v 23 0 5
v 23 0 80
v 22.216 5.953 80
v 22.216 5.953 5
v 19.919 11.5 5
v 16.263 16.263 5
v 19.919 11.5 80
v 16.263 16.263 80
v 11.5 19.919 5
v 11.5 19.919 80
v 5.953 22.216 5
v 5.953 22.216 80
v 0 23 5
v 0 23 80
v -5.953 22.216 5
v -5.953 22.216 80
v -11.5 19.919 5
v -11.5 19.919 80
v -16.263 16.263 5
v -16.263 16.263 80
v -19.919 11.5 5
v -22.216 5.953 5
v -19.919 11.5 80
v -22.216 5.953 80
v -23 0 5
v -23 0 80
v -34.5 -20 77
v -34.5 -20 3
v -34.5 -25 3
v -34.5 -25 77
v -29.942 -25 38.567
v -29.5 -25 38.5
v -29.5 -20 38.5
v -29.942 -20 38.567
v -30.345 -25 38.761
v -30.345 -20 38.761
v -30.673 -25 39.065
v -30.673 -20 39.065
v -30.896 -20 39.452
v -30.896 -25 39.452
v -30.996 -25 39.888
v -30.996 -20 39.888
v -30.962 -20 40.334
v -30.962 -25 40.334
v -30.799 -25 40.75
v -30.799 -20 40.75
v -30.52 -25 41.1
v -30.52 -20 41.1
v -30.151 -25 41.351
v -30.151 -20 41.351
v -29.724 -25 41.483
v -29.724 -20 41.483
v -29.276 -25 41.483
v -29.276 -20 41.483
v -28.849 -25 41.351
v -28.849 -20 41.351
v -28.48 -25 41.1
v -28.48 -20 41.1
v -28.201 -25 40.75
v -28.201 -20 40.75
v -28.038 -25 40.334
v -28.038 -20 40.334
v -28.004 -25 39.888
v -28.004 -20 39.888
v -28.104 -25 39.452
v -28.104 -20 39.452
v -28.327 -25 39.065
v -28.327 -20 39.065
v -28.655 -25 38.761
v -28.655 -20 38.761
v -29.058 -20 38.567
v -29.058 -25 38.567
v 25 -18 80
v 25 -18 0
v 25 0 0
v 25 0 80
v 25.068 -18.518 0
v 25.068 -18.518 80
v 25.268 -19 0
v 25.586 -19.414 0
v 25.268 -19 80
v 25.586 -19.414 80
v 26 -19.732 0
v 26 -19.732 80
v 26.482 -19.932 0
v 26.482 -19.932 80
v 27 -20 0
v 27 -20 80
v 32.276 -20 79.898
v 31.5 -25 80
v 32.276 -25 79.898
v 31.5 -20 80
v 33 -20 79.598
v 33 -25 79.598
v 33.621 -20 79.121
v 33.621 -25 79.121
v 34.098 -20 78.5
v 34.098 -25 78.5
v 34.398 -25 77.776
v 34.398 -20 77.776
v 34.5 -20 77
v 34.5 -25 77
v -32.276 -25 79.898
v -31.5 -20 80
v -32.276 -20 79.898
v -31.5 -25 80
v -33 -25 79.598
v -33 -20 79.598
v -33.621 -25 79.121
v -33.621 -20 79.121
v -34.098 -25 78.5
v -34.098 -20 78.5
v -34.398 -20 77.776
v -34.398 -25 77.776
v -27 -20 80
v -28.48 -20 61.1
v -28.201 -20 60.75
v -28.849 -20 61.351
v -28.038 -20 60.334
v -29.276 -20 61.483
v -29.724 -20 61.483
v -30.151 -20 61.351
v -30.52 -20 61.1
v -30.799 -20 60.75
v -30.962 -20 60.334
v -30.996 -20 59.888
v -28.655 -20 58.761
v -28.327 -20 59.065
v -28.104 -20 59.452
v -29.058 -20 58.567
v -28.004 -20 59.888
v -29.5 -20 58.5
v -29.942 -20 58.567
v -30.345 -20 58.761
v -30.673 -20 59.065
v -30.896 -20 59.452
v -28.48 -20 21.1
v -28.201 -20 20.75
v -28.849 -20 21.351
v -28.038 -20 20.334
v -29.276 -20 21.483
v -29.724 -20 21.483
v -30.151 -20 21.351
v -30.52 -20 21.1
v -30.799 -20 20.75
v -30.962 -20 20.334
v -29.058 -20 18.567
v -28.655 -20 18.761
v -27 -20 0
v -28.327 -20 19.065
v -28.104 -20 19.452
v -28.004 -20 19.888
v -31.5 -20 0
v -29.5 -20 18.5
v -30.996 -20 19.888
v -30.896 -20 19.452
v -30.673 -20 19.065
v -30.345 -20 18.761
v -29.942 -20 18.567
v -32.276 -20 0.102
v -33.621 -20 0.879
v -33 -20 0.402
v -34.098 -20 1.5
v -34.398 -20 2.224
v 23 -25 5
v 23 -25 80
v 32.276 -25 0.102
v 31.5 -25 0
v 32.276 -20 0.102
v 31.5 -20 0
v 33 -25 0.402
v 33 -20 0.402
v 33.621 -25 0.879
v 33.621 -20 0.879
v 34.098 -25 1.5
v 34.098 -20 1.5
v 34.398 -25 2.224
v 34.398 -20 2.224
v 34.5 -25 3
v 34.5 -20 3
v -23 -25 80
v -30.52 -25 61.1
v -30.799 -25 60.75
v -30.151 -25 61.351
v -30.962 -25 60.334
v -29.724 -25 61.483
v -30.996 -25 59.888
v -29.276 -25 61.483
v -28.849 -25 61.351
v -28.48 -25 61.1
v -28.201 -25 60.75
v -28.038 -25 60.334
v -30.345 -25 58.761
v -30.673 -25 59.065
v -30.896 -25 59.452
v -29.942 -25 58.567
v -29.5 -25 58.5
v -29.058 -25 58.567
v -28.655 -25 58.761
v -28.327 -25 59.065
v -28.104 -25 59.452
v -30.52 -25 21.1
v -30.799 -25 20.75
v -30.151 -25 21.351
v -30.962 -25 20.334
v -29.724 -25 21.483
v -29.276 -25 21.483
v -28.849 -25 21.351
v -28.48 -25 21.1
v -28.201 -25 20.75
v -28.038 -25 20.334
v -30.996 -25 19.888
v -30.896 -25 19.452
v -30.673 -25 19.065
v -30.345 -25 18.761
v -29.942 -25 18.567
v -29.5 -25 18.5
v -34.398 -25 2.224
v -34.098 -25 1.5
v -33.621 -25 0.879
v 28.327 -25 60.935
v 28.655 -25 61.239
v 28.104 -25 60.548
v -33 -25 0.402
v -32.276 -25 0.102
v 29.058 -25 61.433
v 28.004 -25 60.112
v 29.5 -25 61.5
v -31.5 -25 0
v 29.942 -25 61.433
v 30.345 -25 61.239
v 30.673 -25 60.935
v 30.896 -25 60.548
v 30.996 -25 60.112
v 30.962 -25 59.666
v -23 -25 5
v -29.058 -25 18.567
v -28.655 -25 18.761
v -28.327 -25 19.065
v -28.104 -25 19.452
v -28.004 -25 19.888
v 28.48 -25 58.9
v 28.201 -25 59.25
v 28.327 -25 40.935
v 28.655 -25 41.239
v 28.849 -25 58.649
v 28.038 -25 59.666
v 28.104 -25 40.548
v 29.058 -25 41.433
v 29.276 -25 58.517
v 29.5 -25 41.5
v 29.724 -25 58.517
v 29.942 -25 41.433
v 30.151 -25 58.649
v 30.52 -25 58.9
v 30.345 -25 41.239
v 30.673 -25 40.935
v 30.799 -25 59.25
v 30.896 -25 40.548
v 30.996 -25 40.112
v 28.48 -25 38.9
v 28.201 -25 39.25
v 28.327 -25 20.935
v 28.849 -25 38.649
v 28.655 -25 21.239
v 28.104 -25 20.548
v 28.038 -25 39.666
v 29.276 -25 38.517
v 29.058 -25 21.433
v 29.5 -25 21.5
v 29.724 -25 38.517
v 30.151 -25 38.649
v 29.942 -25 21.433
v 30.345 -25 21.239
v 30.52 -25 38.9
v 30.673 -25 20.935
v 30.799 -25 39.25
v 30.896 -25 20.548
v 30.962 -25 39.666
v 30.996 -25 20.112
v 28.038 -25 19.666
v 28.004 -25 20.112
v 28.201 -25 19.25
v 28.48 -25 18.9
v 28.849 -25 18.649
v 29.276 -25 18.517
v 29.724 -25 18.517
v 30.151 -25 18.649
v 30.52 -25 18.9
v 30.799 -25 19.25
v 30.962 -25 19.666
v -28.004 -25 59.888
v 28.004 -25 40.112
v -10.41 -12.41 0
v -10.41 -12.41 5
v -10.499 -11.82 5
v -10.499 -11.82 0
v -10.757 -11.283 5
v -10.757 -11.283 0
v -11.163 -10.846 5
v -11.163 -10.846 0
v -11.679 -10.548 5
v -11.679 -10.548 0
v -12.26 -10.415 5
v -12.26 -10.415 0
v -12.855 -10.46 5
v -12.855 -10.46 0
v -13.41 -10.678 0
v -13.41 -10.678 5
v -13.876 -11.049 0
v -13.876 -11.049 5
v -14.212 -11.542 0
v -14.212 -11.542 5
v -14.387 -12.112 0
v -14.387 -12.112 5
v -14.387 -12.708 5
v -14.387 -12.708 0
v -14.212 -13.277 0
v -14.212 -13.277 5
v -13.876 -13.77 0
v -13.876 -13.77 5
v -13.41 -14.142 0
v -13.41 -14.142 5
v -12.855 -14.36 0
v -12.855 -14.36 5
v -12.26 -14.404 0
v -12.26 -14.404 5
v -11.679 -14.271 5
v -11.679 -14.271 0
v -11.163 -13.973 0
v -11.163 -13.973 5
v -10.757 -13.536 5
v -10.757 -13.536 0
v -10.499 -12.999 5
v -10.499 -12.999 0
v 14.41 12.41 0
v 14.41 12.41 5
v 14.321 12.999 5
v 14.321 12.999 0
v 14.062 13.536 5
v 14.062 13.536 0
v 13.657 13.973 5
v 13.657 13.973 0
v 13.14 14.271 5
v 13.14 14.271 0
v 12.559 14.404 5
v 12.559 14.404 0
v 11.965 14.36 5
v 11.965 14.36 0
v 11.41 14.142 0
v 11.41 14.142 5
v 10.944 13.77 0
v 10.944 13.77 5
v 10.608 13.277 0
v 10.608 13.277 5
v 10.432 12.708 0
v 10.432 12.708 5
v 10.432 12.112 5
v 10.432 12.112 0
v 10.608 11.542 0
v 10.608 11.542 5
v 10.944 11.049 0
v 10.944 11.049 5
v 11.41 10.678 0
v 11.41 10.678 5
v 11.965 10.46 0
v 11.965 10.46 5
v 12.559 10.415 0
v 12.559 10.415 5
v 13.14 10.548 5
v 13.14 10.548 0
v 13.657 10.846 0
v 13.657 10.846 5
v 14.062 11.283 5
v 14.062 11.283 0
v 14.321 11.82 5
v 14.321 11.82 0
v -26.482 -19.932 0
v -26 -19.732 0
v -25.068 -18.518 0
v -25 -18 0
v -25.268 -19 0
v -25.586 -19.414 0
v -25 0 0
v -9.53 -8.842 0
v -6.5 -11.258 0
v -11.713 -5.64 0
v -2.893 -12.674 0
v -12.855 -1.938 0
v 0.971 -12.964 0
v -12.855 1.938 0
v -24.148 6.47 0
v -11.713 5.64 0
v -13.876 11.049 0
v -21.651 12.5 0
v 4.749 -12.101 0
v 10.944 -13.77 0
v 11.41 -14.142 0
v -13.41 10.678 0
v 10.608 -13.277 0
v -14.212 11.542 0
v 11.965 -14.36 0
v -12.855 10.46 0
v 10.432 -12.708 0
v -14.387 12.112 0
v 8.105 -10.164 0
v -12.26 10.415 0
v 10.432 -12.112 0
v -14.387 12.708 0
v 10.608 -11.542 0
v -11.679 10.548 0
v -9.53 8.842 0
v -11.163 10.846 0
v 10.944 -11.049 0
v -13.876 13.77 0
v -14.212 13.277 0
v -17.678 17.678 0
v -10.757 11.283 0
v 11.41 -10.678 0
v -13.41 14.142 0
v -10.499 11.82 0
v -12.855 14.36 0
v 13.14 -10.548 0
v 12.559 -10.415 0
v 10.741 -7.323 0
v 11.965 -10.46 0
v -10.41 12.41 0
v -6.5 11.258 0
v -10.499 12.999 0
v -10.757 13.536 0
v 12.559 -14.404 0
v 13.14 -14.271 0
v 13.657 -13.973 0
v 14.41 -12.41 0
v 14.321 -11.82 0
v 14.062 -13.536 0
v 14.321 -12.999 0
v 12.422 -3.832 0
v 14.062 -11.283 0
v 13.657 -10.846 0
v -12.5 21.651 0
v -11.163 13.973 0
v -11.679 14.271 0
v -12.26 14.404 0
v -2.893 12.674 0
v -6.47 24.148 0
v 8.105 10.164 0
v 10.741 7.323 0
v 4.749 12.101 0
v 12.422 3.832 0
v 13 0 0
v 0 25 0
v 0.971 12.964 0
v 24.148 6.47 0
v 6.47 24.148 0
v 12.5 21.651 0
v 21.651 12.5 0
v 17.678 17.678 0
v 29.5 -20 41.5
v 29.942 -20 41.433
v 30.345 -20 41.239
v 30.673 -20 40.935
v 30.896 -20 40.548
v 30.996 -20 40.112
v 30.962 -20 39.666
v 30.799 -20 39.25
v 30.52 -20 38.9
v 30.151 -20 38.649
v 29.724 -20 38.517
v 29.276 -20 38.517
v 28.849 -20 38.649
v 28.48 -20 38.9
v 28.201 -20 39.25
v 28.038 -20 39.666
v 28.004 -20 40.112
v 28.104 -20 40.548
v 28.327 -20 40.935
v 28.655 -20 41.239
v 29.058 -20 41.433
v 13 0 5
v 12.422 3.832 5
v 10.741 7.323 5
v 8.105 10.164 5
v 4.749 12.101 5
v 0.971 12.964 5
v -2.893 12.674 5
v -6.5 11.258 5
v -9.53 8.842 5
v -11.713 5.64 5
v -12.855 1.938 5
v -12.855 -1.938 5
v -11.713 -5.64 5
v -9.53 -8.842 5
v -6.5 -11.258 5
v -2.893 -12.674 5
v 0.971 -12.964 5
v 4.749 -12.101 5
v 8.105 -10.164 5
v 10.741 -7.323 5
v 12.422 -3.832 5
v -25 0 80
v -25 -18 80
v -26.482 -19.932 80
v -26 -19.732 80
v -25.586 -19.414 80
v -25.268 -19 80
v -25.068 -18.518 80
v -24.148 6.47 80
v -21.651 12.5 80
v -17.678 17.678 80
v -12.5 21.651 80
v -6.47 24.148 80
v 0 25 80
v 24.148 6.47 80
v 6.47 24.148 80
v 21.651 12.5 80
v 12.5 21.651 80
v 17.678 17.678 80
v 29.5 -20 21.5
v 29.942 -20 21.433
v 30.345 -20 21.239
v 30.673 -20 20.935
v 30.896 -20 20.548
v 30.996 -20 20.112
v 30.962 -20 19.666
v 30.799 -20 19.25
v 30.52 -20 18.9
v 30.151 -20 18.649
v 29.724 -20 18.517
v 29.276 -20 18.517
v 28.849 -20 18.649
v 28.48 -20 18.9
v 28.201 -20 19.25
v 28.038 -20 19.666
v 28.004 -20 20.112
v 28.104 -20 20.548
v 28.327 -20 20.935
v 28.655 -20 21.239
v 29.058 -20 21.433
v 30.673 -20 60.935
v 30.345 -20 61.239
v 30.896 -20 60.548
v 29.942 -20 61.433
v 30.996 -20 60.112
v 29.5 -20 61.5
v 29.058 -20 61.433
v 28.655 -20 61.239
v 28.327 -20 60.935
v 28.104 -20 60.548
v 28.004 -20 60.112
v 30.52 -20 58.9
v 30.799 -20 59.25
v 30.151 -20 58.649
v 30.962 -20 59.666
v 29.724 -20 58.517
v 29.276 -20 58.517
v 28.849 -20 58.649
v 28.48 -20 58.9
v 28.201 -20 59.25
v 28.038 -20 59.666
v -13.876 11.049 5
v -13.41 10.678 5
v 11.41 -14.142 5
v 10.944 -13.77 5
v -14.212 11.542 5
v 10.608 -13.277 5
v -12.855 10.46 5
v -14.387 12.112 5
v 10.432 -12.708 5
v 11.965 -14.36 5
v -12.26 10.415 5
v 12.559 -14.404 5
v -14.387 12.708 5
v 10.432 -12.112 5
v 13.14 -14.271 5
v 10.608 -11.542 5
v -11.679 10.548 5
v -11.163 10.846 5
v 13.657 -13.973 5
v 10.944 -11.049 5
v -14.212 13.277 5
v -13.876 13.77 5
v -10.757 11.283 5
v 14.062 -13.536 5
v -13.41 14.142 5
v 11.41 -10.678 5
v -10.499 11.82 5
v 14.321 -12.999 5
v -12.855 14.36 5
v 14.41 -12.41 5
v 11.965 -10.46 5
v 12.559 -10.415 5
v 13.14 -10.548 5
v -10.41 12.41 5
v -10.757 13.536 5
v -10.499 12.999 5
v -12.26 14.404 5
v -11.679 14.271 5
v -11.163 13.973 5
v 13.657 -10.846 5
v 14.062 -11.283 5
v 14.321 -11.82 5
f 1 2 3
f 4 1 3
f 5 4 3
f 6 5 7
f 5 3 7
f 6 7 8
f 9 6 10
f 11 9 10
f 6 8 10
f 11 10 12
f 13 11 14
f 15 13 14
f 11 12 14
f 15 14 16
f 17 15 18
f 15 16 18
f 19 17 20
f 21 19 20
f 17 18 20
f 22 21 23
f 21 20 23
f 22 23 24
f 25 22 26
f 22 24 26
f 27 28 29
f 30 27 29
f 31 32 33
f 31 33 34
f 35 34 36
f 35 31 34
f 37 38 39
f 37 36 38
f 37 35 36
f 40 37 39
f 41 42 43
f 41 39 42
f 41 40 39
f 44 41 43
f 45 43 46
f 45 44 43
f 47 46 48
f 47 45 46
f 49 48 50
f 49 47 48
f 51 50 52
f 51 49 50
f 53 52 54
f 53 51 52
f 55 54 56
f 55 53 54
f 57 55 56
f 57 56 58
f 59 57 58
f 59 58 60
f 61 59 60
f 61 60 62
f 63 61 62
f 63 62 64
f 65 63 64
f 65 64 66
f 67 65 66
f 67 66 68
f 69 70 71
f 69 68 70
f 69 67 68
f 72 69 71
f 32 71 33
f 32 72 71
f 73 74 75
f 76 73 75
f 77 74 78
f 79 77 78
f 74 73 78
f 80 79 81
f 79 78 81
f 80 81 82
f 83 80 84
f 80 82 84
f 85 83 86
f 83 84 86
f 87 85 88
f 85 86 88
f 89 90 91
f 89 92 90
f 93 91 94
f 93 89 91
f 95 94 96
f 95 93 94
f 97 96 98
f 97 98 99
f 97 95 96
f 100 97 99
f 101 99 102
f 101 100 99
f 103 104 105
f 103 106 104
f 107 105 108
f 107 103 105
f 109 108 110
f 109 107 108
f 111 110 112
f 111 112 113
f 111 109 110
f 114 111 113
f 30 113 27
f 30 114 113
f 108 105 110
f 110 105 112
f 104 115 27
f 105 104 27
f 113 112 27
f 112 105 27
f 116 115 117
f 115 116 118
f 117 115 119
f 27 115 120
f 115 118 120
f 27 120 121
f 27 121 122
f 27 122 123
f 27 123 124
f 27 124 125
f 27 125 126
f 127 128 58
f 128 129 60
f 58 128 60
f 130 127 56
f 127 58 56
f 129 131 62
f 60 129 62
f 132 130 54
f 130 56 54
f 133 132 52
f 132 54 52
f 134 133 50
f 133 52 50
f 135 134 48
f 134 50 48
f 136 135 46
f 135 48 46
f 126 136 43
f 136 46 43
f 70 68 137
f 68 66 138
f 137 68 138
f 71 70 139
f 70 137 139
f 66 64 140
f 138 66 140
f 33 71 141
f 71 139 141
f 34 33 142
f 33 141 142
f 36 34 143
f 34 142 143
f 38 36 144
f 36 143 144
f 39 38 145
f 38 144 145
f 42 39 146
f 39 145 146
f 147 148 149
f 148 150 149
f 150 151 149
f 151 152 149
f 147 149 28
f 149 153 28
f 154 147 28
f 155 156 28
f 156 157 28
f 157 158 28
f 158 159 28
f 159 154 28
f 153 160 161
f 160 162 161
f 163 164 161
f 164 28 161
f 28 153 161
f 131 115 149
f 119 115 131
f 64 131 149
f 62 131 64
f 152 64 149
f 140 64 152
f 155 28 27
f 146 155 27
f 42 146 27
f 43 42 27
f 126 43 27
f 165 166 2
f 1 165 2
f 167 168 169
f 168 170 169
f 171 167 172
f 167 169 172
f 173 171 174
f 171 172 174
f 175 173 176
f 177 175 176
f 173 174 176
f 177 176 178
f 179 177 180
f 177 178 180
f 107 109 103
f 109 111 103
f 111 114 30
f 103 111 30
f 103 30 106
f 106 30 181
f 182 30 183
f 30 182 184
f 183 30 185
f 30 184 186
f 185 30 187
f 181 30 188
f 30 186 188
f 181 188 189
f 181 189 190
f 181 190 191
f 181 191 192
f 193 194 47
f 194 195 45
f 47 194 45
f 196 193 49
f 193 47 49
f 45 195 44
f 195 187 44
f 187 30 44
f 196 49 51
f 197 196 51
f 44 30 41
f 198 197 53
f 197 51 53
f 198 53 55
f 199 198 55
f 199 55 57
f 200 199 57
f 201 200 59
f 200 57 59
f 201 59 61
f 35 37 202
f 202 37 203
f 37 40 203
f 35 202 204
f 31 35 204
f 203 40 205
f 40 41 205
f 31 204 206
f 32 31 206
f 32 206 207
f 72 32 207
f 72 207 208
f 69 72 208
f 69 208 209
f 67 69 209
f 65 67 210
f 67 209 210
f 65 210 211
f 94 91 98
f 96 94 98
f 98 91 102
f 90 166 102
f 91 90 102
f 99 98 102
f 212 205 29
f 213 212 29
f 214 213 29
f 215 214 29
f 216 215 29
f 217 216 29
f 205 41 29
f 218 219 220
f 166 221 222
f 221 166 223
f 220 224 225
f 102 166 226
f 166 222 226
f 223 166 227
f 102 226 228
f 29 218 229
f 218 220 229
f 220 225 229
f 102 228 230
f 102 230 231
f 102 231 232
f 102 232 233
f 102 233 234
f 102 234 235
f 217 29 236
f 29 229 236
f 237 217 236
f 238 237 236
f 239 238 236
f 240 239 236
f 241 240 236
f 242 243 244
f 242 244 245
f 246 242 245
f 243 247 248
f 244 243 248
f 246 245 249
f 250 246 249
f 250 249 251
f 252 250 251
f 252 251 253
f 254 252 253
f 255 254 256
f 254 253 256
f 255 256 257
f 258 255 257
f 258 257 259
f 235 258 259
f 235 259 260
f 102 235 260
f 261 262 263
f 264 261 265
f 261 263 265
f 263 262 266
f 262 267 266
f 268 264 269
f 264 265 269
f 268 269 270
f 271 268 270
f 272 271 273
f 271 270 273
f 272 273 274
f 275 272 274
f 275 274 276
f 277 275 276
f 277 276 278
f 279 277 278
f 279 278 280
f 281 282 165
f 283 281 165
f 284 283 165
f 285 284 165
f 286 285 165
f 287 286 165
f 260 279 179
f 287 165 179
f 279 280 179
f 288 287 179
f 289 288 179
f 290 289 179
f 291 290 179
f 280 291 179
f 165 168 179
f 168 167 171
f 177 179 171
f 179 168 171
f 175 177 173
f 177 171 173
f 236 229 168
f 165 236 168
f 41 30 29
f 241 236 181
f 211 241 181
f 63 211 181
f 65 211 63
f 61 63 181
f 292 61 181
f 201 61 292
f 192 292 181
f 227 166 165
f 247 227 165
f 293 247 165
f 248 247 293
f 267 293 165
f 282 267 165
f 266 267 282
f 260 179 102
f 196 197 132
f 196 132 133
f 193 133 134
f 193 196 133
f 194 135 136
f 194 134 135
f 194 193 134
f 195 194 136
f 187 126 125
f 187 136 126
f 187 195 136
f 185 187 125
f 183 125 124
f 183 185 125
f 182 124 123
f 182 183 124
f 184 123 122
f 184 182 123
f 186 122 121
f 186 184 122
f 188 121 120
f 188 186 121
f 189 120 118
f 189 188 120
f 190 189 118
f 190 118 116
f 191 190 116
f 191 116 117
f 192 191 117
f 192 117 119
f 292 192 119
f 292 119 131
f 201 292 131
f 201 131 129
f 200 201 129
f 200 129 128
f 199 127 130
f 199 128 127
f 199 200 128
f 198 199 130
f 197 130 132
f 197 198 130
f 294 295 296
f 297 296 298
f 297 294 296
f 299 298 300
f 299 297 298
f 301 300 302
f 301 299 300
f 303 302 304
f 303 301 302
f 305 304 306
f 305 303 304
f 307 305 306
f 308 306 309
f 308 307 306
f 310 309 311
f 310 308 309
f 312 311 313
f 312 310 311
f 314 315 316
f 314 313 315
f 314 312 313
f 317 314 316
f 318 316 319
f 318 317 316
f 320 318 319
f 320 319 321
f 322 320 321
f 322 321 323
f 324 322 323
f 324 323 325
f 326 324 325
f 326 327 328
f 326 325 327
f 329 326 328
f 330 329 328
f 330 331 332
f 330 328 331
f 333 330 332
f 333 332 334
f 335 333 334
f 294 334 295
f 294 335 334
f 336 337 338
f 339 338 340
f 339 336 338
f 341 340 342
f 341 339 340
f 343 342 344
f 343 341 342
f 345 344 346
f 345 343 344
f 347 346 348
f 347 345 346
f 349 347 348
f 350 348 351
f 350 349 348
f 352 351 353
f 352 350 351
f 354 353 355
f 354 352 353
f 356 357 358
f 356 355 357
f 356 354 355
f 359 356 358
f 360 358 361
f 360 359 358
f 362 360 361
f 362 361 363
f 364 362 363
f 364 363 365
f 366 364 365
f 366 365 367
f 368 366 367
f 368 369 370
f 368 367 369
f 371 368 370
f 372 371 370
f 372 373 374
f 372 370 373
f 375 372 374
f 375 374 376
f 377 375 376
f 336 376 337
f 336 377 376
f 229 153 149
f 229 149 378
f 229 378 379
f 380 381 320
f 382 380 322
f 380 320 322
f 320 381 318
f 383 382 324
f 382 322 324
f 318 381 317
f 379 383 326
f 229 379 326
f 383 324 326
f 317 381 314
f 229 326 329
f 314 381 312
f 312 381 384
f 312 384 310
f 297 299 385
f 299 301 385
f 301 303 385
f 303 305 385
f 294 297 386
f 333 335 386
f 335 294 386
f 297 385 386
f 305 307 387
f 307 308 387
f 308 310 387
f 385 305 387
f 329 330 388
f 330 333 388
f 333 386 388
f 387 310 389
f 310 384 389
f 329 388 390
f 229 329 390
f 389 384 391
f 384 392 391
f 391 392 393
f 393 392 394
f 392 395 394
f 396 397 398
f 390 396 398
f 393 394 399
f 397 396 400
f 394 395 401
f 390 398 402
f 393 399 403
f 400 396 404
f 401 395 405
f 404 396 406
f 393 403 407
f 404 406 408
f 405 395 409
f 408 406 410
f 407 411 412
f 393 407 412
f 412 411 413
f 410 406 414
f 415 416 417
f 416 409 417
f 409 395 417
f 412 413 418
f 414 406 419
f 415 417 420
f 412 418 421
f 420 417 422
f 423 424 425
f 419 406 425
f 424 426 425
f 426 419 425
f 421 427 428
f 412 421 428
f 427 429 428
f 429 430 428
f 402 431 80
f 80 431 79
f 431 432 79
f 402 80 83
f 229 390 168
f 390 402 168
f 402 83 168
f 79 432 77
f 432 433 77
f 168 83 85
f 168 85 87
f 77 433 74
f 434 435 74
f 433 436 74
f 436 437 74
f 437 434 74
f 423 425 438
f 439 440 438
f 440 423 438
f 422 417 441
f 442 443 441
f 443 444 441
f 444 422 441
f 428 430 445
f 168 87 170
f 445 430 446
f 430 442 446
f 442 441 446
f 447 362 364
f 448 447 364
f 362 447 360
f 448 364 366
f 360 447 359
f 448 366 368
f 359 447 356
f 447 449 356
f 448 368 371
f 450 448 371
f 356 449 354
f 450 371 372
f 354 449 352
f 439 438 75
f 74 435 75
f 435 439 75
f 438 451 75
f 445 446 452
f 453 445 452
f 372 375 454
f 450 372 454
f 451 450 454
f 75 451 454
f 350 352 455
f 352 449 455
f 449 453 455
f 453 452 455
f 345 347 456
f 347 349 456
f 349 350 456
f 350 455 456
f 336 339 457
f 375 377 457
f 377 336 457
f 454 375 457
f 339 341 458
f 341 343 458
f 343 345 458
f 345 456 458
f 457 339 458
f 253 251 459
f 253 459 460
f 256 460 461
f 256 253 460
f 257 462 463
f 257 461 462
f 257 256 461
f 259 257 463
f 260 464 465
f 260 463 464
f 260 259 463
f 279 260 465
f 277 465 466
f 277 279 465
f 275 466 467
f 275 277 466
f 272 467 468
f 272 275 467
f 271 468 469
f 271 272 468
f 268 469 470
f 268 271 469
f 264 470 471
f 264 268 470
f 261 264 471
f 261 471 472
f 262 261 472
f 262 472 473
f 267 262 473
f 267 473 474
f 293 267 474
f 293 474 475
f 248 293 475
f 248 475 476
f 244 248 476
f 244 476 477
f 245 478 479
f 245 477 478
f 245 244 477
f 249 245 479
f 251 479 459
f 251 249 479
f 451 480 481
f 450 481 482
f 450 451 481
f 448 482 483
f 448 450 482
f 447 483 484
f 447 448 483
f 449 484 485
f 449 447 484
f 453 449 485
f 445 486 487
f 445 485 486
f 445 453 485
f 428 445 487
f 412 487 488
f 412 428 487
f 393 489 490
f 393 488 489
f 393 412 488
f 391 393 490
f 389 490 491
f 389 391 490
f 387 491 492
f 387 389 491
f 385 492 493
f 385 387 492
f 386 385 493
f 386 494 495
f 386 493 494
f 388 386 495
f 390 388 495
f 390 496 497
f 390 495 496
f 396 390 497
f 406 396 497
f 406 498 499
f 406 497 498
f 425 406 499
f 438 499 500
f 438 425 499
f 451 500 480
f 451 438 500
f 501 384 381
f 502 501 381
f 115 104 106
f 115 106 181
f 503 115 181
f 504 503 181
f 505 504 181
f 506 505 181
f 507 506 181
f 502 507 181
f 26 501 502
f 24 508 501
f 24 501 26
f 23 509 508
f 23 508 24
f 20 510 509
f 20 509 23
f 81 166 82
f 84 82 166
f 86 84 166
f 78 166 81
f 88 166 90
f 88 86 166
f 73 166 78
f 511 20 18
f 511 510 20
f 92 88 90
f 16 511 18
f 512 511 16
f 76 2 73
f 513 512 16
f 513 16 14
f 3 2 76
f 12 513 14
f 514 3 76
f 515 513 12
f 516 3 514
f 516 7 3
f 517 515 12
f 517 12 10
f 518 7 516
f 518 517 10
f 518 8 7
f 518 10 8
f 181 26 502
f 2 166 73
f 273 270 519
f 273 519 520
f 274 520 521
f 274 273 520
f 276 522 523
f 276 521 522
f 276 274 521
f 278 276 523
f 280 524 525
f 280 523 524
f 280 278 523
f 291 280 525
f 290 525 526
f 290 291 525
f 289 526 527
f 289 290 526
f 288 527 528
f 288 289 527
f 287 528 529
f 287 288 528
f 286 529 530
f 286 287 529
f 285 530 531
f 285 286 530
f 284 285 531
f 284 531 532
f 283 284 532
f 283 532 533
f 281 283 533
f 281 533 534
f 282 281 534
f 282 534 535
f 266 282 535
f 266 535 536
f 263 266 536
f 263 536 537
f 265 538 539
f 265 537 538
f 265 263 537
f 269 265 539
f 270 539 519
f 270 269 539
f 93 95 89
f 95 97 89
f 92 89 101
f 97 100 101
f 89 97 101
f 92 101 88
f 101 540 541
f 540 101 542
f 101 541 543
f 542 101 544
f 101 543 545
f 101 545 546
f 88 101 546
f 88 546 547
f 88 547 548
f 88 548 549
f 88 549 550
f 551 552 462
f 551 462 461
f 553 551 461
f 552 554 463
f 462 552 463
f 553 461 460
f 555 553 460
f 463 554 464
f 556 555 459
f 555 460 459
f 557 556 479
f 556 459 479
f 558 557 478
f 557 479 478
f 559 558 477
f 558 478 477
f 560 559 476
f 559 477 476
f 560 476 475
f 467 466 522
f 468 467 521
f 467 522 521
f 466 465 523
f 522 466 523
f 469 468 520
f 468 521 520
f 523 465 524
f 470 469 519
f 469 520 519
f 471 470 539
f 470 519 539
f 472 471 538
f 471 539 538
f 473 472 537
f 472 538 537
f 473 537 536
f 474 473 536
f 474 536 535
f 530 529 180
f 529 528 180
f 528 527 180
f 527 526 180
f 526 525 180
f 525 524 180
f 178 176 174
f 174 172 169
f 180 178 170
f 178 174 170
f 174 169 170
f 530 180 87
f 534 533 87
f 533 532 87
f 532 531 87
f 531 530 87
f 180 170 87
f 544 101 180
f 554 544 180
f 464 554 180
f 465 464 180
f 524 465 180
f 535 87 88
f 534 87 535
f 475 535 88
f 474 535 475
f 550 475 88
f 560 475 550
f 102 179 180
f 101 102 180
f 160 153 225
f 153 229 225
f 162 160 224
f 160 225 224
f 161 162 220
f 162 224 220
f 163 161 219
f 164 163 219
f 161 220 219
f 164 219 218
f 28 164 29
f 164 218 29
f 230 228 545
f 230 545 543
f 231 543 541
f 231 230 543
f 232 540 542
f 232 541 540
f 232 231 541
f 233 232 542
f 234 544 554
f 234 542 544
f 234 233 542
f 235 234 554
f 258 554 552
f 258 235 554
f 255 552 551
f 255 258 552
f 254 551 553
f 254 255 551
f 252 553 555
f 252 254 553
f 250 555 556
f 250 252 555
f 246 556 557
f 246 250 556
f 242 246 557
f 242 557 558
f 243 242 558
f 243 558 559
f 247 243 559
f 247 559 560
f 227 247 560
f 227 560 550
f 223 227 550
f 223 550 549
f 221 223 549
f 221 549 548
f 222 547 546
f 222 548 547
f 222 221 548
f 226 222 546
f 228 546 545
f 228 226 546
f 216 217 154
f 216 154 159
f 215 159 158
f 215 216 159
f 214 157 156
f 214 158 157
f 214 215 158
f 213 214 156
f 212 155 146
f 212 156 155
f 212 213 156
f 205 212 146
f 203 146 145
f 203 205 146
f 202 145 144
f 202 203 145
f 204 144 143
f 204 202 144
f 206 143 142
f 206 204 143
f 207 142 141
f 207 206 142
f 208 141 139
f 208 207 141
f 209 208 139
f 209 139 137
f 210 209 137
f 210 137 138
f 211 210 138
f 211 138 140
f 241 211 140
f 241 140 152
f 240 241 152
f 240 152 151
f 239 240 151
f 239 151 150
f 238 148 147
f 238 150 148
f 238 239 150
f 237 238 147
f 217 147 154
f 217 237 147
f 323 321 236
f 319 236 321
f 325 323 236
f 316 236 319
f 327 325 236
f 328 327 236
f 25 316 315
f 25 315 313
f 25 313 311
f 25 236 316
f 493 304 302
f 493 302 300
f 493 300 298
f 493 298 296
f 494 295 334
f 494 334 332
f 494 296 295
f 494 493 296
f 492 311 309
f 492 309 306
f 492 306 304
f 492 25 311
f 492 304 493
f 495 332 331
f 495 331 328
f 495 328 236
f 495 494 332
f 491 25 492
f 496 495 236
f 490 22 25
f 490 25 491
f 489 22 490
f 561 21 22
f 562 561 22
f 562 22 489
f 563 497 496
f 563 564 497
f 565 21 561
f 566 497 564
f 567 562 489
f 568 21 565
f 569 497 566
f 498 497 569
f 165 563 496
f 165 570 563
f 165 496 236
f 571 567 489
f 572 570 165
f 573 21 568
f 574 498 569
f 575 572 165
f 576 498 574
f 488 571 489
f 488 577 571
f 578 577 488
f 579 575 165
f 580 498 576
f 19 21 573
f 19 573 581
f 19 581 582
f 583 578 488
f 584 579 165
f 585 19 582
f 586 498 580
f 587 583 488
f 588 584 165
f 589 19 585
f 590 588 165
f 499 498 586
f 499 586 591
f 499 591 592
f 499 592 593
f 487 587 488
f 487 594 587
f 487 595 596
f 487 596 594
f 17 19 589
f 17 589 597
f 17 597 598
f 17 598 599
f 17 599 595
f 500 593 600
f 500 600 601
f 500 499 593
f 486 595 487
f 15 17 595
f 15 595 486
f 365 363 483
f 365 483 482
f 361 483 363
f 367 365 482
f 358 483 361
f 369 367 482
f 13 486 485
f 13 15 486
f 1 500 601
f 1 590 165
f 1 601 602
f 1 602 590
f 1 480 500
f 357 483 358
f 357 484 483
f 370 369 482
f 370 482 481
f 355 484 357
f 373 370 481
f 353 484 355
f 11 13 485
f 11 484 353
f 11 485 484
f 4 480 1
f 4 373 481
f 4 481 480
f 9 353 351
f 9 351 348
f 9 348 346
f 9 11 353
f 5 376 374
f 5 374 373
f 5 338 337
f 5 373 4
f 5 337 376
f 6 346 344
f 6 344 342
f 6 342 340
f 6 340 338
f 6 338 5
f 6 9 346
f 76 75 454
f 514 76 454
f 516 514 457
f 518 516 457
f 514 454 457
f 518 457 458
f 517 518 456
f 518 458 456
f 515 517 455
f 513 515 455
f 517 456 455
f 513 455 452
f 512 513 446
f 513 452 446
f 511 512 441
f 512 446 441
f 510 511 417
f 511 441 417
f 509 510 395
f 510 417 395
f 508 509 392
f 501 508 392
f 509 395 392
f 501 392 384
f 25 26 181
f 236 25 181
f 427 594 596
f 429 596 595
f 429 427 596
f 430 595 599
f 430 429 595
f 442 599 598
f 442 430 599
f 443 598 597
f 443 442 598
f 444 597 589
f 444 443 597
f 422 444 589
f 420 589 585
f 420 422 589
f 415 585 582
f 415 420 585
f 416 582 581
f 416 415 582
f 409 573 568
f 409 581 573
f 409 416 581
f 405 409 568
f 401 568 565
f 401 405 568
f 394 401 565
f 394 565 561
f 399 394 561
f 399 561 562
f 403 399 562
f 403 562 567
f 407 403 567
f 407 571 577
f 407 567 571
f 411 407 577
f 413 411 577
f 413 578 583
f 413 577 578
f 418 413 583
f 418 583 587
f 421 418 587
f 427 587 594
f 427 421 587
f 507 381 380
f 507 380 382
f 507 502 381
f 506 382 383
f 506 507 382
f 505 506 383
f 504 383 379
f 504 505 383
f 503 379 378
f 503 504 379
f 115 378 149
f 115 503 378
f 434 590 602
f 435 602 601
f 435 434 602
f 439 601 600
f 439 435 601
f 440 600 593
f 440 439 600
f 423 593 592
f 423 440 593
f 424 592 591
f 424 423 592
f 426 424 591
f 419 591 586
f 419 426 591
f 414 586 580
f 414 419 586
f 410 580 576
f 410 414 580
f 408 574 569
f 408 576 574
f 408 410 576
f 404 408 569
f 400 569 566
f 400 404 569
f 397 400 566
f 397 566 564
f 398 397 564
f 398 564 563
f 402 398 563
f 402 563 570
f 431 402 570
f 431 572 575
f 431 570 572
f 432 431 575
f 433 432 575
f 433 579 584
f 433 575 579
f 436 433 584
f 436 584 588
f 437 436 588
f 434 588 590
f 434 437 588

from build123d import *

# Parameters (mm, degrees)
SKETCH1_R               = 2
SKETCH1_R_2             = 13
BOSS_EXTRUDE1_DEPTH     = 80
CUT_EXTRUDE1_DEPTH      = 75
CUT_EXTRUDE2_DEPTH      = 99.05738116
CUT_EXTRUDE2_DEPTH_BACK = 99.05738116
SKETCH3_R               = 1.5
FILLET3_R               = 2
FILLET2_R               = 3


with BuildPart() as part:
    # Sketch1 → Boss-Extrude1 (new body)
    with BuildSketch(Plane.XY):
        with BuildLine():
            Line((-25, 0), (-25, -20))
            Line((-25, -20), (-34.5, -20))
            Line((-34.5, -20), (-34.5, -25))
            Line((-34.5, -25), (34.5, -25))
            Line((34.5, -25), (34.5, -20))
            Line((34.5, -20), (25, -20))
            Line((25, -20), (25, 0))
            ThreePointArc((25, 0), (0, 25), (-25, 0))
        make_face()
        with Locations((-12.40972401, 12.40972401)):
            Circle(SKETCH1_R, mode=Mode.SUBTRACT)
        with Locations((12.40972401, 12.40972401)):
            Circle(SKETCH1_R, mode=Mode.SUBTRACT)
        with Locations((12.40972401, -12.40972401)):
            Circle(SKETCH1_R, mode=Mode.SUBTRACT)
        with Locations((-12.40972401, -12.40972401)):
            Circle(SKETCH1_R, mode=Mode.SUBTRACT)
        Circle(SKETCH1_R_2, mode=Mode.SUBTRACT)
    extrude(amount=BOSS_EXTRUDE1_DEPTH)

    # Sketch2 → Cut-Extrude1 (cut)
    with BuildSketch(Plane.XY.offset(80)):
        with BuildLine():
            Line((-23, 0), (-23, -25))
            Line((-23, -25), (23, -25))
            Line((23, -25), (23, 0))
            ThreePointArc((23, 0), (0, 23), (-23, 0))
        make_face()
    extrude(amount=-CUT_EXTRUDE1_DEPTH, mode=Mode.SUBTRACT)

    # Sketch3 → Cut-Extrude2 (cut, two sides: drawn at the far end of the back side and taken through both)
    with BuildSketch(Plane(origin=(0, -20, 0), x_dir=(1, 0, 0), z_dir=(0, 1, 0)).offset(-CUT_EXTRUDE2_DEPTH_BACK)):
        with Locations(Location((29.5, -40, 0), (0, 0, 270))):
            Circle(SKETCH3_R)
        with Locations(Location((29.5, -60, 0), (0, 0, 270))):
            Circle(SKETCH3_R)
        with Locations(Location((29.5, -20, 0), (0, 0, 270))):
            Circle(SKETCH3_R)
        with Locations(Location((-29.5, -60, 0), (0, 0, 90))):
            Circle(SKETCH3_R)
        with Locations(Location((-29.5, -40, 0), (0, 0, 90))):
            Circle(SKETCH3_R)
        with Locations(Location((-29.5, -20, 0), (0, 0, 90))):
            Circle(SKETCH3_R)
    extrude(amount=CUT_EXTRUDE2_DEPTH + CUT_EXTRUDE2_DEPTH_BACK, mode=Mode.SUBTRACT)

    # Fillet3
    fillet3_edges = [part.edges().sort_by_distance(p)[0] for p in [
        (25, -20, 40),
        (-25, -20, 40),
    ]]
    fillet(fillet3_edges, radius=FILLET3_R)

    # Fillet2
    fillet2_edges = [part.edges().sort_by_distance(p)[0] for p in [
        (-34.5, -22.5, 0),
        (-34.5, -22.5, 80),
        (34.5, -22.5, 80),
        (34.5, -22.5, 0),
    ]]
    fillet(fillet2_edges, radius=FILLET2_R)


solid = part.part
